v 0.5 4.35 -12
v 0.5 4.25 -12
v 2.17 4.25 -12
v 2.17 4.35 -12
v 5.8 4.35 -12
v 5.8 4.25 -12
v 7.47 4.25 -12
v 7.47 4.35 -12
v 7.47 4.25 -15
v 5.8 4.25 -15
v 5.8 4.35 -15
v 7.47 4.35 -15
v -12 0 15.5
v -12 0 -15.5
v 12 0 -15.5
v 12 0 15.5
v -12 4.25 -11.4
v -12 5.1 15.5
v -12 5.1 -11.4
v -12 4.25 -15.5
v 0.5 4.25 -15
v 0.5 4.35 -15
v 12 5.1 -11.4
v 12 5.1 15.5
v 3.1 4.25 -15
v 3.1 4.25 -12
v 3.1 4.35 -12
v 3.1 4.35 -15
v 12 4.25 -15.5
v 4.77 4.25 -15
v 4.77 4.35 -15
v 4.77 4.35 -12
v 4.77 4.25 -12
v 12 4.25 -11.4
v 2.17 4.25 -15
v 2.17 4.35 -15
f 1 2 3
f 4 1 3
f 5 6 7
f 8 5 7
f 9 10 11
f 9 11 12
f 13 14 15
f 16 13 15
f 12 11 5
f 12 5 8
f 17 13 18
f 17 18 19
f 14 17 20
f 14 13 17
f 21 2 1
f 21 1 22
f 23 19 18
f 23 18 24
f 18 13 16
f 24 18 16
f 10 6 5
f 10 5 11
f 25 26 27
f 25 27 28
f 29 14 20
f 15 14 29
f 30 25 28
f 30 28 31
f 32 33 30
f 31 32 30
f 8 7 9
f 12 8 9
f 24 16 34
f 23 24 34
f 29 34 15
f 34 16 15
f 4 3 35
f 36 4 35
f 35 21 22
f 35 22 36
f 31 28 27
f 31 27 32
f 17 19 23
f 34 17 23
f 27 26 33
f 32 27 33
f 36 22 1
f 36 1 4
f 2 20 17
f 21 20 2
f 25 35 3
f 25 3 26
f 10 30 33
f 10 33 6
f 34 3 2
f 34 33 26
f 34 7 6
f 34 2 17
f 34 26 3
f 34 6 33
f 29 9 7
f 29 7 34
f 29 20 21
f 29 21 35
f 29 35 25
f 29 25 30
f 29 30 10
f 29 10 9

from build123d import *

# Parameters (mm, degrees)
SKETCH_1_W          = 24
SKETCH_1_H          = 31
EXTRUDE_1_DEPTH     = 5.1
SKETCH_2_W          = 24
SKETCH_2_H          = 4.1
CUT_EXTRUDE_1_DEPTH = 0.85
SKETCH_3_W          = 1.67
SKETCH_3_H          = 3
EXTRUDE_2_DEPTH     = 0.1


with BuildPart() as part:
    # Эскиз1 → Бобышка-Вытянуть1 (new body)
    with BuildSketch(Plane(origin=(0, 0, 0), x_dir=(1, 0, 0), z_dir=(0, 1, 0))):
        Rectangle(SKETCH_1_W, SKETCH_1_H)
    extrude(amount=EXTRUDE_1_DEPTH)

    # Эскиз2 → Вырез-Вытянуть1 (cut)
    with BuildSketch(Plane(origin=(0, 5.1, 0), x_dir=(1, 0, 0), z_dir=(0, 1, 0))):
        with Locations((0, 13.45)):
            Rectangle(SKETCH_2_W, SKETCH_2_H)
    extrude(amount=-CUT_EXTRUDE_1_DEPTH, mode=Mode.SUBTRACT)

    # Эскиз3 → Бобышка-Вытянуть2 (add)
    with BuildSketch(Plane(origin=(0, 4.25, 0), x_dir=(1, 0, 0), z_dir=(0, 1, 0))):
        with Locations((1.335, 13.5)):
            Rectangle(SKETCH_3_W, SKETCH_3_H)
        with Locations((3.935, 13.5)):
            Rectangle(SKETCH_3_W, SKETCH_3_H)
        with Locations((6.635, 13.5)):
            Rectangle(SKETCH_3_W, SKETCH_3_H)
    extrude(amount=EXTRUDE_2_DEPTH)


solid = part.part
